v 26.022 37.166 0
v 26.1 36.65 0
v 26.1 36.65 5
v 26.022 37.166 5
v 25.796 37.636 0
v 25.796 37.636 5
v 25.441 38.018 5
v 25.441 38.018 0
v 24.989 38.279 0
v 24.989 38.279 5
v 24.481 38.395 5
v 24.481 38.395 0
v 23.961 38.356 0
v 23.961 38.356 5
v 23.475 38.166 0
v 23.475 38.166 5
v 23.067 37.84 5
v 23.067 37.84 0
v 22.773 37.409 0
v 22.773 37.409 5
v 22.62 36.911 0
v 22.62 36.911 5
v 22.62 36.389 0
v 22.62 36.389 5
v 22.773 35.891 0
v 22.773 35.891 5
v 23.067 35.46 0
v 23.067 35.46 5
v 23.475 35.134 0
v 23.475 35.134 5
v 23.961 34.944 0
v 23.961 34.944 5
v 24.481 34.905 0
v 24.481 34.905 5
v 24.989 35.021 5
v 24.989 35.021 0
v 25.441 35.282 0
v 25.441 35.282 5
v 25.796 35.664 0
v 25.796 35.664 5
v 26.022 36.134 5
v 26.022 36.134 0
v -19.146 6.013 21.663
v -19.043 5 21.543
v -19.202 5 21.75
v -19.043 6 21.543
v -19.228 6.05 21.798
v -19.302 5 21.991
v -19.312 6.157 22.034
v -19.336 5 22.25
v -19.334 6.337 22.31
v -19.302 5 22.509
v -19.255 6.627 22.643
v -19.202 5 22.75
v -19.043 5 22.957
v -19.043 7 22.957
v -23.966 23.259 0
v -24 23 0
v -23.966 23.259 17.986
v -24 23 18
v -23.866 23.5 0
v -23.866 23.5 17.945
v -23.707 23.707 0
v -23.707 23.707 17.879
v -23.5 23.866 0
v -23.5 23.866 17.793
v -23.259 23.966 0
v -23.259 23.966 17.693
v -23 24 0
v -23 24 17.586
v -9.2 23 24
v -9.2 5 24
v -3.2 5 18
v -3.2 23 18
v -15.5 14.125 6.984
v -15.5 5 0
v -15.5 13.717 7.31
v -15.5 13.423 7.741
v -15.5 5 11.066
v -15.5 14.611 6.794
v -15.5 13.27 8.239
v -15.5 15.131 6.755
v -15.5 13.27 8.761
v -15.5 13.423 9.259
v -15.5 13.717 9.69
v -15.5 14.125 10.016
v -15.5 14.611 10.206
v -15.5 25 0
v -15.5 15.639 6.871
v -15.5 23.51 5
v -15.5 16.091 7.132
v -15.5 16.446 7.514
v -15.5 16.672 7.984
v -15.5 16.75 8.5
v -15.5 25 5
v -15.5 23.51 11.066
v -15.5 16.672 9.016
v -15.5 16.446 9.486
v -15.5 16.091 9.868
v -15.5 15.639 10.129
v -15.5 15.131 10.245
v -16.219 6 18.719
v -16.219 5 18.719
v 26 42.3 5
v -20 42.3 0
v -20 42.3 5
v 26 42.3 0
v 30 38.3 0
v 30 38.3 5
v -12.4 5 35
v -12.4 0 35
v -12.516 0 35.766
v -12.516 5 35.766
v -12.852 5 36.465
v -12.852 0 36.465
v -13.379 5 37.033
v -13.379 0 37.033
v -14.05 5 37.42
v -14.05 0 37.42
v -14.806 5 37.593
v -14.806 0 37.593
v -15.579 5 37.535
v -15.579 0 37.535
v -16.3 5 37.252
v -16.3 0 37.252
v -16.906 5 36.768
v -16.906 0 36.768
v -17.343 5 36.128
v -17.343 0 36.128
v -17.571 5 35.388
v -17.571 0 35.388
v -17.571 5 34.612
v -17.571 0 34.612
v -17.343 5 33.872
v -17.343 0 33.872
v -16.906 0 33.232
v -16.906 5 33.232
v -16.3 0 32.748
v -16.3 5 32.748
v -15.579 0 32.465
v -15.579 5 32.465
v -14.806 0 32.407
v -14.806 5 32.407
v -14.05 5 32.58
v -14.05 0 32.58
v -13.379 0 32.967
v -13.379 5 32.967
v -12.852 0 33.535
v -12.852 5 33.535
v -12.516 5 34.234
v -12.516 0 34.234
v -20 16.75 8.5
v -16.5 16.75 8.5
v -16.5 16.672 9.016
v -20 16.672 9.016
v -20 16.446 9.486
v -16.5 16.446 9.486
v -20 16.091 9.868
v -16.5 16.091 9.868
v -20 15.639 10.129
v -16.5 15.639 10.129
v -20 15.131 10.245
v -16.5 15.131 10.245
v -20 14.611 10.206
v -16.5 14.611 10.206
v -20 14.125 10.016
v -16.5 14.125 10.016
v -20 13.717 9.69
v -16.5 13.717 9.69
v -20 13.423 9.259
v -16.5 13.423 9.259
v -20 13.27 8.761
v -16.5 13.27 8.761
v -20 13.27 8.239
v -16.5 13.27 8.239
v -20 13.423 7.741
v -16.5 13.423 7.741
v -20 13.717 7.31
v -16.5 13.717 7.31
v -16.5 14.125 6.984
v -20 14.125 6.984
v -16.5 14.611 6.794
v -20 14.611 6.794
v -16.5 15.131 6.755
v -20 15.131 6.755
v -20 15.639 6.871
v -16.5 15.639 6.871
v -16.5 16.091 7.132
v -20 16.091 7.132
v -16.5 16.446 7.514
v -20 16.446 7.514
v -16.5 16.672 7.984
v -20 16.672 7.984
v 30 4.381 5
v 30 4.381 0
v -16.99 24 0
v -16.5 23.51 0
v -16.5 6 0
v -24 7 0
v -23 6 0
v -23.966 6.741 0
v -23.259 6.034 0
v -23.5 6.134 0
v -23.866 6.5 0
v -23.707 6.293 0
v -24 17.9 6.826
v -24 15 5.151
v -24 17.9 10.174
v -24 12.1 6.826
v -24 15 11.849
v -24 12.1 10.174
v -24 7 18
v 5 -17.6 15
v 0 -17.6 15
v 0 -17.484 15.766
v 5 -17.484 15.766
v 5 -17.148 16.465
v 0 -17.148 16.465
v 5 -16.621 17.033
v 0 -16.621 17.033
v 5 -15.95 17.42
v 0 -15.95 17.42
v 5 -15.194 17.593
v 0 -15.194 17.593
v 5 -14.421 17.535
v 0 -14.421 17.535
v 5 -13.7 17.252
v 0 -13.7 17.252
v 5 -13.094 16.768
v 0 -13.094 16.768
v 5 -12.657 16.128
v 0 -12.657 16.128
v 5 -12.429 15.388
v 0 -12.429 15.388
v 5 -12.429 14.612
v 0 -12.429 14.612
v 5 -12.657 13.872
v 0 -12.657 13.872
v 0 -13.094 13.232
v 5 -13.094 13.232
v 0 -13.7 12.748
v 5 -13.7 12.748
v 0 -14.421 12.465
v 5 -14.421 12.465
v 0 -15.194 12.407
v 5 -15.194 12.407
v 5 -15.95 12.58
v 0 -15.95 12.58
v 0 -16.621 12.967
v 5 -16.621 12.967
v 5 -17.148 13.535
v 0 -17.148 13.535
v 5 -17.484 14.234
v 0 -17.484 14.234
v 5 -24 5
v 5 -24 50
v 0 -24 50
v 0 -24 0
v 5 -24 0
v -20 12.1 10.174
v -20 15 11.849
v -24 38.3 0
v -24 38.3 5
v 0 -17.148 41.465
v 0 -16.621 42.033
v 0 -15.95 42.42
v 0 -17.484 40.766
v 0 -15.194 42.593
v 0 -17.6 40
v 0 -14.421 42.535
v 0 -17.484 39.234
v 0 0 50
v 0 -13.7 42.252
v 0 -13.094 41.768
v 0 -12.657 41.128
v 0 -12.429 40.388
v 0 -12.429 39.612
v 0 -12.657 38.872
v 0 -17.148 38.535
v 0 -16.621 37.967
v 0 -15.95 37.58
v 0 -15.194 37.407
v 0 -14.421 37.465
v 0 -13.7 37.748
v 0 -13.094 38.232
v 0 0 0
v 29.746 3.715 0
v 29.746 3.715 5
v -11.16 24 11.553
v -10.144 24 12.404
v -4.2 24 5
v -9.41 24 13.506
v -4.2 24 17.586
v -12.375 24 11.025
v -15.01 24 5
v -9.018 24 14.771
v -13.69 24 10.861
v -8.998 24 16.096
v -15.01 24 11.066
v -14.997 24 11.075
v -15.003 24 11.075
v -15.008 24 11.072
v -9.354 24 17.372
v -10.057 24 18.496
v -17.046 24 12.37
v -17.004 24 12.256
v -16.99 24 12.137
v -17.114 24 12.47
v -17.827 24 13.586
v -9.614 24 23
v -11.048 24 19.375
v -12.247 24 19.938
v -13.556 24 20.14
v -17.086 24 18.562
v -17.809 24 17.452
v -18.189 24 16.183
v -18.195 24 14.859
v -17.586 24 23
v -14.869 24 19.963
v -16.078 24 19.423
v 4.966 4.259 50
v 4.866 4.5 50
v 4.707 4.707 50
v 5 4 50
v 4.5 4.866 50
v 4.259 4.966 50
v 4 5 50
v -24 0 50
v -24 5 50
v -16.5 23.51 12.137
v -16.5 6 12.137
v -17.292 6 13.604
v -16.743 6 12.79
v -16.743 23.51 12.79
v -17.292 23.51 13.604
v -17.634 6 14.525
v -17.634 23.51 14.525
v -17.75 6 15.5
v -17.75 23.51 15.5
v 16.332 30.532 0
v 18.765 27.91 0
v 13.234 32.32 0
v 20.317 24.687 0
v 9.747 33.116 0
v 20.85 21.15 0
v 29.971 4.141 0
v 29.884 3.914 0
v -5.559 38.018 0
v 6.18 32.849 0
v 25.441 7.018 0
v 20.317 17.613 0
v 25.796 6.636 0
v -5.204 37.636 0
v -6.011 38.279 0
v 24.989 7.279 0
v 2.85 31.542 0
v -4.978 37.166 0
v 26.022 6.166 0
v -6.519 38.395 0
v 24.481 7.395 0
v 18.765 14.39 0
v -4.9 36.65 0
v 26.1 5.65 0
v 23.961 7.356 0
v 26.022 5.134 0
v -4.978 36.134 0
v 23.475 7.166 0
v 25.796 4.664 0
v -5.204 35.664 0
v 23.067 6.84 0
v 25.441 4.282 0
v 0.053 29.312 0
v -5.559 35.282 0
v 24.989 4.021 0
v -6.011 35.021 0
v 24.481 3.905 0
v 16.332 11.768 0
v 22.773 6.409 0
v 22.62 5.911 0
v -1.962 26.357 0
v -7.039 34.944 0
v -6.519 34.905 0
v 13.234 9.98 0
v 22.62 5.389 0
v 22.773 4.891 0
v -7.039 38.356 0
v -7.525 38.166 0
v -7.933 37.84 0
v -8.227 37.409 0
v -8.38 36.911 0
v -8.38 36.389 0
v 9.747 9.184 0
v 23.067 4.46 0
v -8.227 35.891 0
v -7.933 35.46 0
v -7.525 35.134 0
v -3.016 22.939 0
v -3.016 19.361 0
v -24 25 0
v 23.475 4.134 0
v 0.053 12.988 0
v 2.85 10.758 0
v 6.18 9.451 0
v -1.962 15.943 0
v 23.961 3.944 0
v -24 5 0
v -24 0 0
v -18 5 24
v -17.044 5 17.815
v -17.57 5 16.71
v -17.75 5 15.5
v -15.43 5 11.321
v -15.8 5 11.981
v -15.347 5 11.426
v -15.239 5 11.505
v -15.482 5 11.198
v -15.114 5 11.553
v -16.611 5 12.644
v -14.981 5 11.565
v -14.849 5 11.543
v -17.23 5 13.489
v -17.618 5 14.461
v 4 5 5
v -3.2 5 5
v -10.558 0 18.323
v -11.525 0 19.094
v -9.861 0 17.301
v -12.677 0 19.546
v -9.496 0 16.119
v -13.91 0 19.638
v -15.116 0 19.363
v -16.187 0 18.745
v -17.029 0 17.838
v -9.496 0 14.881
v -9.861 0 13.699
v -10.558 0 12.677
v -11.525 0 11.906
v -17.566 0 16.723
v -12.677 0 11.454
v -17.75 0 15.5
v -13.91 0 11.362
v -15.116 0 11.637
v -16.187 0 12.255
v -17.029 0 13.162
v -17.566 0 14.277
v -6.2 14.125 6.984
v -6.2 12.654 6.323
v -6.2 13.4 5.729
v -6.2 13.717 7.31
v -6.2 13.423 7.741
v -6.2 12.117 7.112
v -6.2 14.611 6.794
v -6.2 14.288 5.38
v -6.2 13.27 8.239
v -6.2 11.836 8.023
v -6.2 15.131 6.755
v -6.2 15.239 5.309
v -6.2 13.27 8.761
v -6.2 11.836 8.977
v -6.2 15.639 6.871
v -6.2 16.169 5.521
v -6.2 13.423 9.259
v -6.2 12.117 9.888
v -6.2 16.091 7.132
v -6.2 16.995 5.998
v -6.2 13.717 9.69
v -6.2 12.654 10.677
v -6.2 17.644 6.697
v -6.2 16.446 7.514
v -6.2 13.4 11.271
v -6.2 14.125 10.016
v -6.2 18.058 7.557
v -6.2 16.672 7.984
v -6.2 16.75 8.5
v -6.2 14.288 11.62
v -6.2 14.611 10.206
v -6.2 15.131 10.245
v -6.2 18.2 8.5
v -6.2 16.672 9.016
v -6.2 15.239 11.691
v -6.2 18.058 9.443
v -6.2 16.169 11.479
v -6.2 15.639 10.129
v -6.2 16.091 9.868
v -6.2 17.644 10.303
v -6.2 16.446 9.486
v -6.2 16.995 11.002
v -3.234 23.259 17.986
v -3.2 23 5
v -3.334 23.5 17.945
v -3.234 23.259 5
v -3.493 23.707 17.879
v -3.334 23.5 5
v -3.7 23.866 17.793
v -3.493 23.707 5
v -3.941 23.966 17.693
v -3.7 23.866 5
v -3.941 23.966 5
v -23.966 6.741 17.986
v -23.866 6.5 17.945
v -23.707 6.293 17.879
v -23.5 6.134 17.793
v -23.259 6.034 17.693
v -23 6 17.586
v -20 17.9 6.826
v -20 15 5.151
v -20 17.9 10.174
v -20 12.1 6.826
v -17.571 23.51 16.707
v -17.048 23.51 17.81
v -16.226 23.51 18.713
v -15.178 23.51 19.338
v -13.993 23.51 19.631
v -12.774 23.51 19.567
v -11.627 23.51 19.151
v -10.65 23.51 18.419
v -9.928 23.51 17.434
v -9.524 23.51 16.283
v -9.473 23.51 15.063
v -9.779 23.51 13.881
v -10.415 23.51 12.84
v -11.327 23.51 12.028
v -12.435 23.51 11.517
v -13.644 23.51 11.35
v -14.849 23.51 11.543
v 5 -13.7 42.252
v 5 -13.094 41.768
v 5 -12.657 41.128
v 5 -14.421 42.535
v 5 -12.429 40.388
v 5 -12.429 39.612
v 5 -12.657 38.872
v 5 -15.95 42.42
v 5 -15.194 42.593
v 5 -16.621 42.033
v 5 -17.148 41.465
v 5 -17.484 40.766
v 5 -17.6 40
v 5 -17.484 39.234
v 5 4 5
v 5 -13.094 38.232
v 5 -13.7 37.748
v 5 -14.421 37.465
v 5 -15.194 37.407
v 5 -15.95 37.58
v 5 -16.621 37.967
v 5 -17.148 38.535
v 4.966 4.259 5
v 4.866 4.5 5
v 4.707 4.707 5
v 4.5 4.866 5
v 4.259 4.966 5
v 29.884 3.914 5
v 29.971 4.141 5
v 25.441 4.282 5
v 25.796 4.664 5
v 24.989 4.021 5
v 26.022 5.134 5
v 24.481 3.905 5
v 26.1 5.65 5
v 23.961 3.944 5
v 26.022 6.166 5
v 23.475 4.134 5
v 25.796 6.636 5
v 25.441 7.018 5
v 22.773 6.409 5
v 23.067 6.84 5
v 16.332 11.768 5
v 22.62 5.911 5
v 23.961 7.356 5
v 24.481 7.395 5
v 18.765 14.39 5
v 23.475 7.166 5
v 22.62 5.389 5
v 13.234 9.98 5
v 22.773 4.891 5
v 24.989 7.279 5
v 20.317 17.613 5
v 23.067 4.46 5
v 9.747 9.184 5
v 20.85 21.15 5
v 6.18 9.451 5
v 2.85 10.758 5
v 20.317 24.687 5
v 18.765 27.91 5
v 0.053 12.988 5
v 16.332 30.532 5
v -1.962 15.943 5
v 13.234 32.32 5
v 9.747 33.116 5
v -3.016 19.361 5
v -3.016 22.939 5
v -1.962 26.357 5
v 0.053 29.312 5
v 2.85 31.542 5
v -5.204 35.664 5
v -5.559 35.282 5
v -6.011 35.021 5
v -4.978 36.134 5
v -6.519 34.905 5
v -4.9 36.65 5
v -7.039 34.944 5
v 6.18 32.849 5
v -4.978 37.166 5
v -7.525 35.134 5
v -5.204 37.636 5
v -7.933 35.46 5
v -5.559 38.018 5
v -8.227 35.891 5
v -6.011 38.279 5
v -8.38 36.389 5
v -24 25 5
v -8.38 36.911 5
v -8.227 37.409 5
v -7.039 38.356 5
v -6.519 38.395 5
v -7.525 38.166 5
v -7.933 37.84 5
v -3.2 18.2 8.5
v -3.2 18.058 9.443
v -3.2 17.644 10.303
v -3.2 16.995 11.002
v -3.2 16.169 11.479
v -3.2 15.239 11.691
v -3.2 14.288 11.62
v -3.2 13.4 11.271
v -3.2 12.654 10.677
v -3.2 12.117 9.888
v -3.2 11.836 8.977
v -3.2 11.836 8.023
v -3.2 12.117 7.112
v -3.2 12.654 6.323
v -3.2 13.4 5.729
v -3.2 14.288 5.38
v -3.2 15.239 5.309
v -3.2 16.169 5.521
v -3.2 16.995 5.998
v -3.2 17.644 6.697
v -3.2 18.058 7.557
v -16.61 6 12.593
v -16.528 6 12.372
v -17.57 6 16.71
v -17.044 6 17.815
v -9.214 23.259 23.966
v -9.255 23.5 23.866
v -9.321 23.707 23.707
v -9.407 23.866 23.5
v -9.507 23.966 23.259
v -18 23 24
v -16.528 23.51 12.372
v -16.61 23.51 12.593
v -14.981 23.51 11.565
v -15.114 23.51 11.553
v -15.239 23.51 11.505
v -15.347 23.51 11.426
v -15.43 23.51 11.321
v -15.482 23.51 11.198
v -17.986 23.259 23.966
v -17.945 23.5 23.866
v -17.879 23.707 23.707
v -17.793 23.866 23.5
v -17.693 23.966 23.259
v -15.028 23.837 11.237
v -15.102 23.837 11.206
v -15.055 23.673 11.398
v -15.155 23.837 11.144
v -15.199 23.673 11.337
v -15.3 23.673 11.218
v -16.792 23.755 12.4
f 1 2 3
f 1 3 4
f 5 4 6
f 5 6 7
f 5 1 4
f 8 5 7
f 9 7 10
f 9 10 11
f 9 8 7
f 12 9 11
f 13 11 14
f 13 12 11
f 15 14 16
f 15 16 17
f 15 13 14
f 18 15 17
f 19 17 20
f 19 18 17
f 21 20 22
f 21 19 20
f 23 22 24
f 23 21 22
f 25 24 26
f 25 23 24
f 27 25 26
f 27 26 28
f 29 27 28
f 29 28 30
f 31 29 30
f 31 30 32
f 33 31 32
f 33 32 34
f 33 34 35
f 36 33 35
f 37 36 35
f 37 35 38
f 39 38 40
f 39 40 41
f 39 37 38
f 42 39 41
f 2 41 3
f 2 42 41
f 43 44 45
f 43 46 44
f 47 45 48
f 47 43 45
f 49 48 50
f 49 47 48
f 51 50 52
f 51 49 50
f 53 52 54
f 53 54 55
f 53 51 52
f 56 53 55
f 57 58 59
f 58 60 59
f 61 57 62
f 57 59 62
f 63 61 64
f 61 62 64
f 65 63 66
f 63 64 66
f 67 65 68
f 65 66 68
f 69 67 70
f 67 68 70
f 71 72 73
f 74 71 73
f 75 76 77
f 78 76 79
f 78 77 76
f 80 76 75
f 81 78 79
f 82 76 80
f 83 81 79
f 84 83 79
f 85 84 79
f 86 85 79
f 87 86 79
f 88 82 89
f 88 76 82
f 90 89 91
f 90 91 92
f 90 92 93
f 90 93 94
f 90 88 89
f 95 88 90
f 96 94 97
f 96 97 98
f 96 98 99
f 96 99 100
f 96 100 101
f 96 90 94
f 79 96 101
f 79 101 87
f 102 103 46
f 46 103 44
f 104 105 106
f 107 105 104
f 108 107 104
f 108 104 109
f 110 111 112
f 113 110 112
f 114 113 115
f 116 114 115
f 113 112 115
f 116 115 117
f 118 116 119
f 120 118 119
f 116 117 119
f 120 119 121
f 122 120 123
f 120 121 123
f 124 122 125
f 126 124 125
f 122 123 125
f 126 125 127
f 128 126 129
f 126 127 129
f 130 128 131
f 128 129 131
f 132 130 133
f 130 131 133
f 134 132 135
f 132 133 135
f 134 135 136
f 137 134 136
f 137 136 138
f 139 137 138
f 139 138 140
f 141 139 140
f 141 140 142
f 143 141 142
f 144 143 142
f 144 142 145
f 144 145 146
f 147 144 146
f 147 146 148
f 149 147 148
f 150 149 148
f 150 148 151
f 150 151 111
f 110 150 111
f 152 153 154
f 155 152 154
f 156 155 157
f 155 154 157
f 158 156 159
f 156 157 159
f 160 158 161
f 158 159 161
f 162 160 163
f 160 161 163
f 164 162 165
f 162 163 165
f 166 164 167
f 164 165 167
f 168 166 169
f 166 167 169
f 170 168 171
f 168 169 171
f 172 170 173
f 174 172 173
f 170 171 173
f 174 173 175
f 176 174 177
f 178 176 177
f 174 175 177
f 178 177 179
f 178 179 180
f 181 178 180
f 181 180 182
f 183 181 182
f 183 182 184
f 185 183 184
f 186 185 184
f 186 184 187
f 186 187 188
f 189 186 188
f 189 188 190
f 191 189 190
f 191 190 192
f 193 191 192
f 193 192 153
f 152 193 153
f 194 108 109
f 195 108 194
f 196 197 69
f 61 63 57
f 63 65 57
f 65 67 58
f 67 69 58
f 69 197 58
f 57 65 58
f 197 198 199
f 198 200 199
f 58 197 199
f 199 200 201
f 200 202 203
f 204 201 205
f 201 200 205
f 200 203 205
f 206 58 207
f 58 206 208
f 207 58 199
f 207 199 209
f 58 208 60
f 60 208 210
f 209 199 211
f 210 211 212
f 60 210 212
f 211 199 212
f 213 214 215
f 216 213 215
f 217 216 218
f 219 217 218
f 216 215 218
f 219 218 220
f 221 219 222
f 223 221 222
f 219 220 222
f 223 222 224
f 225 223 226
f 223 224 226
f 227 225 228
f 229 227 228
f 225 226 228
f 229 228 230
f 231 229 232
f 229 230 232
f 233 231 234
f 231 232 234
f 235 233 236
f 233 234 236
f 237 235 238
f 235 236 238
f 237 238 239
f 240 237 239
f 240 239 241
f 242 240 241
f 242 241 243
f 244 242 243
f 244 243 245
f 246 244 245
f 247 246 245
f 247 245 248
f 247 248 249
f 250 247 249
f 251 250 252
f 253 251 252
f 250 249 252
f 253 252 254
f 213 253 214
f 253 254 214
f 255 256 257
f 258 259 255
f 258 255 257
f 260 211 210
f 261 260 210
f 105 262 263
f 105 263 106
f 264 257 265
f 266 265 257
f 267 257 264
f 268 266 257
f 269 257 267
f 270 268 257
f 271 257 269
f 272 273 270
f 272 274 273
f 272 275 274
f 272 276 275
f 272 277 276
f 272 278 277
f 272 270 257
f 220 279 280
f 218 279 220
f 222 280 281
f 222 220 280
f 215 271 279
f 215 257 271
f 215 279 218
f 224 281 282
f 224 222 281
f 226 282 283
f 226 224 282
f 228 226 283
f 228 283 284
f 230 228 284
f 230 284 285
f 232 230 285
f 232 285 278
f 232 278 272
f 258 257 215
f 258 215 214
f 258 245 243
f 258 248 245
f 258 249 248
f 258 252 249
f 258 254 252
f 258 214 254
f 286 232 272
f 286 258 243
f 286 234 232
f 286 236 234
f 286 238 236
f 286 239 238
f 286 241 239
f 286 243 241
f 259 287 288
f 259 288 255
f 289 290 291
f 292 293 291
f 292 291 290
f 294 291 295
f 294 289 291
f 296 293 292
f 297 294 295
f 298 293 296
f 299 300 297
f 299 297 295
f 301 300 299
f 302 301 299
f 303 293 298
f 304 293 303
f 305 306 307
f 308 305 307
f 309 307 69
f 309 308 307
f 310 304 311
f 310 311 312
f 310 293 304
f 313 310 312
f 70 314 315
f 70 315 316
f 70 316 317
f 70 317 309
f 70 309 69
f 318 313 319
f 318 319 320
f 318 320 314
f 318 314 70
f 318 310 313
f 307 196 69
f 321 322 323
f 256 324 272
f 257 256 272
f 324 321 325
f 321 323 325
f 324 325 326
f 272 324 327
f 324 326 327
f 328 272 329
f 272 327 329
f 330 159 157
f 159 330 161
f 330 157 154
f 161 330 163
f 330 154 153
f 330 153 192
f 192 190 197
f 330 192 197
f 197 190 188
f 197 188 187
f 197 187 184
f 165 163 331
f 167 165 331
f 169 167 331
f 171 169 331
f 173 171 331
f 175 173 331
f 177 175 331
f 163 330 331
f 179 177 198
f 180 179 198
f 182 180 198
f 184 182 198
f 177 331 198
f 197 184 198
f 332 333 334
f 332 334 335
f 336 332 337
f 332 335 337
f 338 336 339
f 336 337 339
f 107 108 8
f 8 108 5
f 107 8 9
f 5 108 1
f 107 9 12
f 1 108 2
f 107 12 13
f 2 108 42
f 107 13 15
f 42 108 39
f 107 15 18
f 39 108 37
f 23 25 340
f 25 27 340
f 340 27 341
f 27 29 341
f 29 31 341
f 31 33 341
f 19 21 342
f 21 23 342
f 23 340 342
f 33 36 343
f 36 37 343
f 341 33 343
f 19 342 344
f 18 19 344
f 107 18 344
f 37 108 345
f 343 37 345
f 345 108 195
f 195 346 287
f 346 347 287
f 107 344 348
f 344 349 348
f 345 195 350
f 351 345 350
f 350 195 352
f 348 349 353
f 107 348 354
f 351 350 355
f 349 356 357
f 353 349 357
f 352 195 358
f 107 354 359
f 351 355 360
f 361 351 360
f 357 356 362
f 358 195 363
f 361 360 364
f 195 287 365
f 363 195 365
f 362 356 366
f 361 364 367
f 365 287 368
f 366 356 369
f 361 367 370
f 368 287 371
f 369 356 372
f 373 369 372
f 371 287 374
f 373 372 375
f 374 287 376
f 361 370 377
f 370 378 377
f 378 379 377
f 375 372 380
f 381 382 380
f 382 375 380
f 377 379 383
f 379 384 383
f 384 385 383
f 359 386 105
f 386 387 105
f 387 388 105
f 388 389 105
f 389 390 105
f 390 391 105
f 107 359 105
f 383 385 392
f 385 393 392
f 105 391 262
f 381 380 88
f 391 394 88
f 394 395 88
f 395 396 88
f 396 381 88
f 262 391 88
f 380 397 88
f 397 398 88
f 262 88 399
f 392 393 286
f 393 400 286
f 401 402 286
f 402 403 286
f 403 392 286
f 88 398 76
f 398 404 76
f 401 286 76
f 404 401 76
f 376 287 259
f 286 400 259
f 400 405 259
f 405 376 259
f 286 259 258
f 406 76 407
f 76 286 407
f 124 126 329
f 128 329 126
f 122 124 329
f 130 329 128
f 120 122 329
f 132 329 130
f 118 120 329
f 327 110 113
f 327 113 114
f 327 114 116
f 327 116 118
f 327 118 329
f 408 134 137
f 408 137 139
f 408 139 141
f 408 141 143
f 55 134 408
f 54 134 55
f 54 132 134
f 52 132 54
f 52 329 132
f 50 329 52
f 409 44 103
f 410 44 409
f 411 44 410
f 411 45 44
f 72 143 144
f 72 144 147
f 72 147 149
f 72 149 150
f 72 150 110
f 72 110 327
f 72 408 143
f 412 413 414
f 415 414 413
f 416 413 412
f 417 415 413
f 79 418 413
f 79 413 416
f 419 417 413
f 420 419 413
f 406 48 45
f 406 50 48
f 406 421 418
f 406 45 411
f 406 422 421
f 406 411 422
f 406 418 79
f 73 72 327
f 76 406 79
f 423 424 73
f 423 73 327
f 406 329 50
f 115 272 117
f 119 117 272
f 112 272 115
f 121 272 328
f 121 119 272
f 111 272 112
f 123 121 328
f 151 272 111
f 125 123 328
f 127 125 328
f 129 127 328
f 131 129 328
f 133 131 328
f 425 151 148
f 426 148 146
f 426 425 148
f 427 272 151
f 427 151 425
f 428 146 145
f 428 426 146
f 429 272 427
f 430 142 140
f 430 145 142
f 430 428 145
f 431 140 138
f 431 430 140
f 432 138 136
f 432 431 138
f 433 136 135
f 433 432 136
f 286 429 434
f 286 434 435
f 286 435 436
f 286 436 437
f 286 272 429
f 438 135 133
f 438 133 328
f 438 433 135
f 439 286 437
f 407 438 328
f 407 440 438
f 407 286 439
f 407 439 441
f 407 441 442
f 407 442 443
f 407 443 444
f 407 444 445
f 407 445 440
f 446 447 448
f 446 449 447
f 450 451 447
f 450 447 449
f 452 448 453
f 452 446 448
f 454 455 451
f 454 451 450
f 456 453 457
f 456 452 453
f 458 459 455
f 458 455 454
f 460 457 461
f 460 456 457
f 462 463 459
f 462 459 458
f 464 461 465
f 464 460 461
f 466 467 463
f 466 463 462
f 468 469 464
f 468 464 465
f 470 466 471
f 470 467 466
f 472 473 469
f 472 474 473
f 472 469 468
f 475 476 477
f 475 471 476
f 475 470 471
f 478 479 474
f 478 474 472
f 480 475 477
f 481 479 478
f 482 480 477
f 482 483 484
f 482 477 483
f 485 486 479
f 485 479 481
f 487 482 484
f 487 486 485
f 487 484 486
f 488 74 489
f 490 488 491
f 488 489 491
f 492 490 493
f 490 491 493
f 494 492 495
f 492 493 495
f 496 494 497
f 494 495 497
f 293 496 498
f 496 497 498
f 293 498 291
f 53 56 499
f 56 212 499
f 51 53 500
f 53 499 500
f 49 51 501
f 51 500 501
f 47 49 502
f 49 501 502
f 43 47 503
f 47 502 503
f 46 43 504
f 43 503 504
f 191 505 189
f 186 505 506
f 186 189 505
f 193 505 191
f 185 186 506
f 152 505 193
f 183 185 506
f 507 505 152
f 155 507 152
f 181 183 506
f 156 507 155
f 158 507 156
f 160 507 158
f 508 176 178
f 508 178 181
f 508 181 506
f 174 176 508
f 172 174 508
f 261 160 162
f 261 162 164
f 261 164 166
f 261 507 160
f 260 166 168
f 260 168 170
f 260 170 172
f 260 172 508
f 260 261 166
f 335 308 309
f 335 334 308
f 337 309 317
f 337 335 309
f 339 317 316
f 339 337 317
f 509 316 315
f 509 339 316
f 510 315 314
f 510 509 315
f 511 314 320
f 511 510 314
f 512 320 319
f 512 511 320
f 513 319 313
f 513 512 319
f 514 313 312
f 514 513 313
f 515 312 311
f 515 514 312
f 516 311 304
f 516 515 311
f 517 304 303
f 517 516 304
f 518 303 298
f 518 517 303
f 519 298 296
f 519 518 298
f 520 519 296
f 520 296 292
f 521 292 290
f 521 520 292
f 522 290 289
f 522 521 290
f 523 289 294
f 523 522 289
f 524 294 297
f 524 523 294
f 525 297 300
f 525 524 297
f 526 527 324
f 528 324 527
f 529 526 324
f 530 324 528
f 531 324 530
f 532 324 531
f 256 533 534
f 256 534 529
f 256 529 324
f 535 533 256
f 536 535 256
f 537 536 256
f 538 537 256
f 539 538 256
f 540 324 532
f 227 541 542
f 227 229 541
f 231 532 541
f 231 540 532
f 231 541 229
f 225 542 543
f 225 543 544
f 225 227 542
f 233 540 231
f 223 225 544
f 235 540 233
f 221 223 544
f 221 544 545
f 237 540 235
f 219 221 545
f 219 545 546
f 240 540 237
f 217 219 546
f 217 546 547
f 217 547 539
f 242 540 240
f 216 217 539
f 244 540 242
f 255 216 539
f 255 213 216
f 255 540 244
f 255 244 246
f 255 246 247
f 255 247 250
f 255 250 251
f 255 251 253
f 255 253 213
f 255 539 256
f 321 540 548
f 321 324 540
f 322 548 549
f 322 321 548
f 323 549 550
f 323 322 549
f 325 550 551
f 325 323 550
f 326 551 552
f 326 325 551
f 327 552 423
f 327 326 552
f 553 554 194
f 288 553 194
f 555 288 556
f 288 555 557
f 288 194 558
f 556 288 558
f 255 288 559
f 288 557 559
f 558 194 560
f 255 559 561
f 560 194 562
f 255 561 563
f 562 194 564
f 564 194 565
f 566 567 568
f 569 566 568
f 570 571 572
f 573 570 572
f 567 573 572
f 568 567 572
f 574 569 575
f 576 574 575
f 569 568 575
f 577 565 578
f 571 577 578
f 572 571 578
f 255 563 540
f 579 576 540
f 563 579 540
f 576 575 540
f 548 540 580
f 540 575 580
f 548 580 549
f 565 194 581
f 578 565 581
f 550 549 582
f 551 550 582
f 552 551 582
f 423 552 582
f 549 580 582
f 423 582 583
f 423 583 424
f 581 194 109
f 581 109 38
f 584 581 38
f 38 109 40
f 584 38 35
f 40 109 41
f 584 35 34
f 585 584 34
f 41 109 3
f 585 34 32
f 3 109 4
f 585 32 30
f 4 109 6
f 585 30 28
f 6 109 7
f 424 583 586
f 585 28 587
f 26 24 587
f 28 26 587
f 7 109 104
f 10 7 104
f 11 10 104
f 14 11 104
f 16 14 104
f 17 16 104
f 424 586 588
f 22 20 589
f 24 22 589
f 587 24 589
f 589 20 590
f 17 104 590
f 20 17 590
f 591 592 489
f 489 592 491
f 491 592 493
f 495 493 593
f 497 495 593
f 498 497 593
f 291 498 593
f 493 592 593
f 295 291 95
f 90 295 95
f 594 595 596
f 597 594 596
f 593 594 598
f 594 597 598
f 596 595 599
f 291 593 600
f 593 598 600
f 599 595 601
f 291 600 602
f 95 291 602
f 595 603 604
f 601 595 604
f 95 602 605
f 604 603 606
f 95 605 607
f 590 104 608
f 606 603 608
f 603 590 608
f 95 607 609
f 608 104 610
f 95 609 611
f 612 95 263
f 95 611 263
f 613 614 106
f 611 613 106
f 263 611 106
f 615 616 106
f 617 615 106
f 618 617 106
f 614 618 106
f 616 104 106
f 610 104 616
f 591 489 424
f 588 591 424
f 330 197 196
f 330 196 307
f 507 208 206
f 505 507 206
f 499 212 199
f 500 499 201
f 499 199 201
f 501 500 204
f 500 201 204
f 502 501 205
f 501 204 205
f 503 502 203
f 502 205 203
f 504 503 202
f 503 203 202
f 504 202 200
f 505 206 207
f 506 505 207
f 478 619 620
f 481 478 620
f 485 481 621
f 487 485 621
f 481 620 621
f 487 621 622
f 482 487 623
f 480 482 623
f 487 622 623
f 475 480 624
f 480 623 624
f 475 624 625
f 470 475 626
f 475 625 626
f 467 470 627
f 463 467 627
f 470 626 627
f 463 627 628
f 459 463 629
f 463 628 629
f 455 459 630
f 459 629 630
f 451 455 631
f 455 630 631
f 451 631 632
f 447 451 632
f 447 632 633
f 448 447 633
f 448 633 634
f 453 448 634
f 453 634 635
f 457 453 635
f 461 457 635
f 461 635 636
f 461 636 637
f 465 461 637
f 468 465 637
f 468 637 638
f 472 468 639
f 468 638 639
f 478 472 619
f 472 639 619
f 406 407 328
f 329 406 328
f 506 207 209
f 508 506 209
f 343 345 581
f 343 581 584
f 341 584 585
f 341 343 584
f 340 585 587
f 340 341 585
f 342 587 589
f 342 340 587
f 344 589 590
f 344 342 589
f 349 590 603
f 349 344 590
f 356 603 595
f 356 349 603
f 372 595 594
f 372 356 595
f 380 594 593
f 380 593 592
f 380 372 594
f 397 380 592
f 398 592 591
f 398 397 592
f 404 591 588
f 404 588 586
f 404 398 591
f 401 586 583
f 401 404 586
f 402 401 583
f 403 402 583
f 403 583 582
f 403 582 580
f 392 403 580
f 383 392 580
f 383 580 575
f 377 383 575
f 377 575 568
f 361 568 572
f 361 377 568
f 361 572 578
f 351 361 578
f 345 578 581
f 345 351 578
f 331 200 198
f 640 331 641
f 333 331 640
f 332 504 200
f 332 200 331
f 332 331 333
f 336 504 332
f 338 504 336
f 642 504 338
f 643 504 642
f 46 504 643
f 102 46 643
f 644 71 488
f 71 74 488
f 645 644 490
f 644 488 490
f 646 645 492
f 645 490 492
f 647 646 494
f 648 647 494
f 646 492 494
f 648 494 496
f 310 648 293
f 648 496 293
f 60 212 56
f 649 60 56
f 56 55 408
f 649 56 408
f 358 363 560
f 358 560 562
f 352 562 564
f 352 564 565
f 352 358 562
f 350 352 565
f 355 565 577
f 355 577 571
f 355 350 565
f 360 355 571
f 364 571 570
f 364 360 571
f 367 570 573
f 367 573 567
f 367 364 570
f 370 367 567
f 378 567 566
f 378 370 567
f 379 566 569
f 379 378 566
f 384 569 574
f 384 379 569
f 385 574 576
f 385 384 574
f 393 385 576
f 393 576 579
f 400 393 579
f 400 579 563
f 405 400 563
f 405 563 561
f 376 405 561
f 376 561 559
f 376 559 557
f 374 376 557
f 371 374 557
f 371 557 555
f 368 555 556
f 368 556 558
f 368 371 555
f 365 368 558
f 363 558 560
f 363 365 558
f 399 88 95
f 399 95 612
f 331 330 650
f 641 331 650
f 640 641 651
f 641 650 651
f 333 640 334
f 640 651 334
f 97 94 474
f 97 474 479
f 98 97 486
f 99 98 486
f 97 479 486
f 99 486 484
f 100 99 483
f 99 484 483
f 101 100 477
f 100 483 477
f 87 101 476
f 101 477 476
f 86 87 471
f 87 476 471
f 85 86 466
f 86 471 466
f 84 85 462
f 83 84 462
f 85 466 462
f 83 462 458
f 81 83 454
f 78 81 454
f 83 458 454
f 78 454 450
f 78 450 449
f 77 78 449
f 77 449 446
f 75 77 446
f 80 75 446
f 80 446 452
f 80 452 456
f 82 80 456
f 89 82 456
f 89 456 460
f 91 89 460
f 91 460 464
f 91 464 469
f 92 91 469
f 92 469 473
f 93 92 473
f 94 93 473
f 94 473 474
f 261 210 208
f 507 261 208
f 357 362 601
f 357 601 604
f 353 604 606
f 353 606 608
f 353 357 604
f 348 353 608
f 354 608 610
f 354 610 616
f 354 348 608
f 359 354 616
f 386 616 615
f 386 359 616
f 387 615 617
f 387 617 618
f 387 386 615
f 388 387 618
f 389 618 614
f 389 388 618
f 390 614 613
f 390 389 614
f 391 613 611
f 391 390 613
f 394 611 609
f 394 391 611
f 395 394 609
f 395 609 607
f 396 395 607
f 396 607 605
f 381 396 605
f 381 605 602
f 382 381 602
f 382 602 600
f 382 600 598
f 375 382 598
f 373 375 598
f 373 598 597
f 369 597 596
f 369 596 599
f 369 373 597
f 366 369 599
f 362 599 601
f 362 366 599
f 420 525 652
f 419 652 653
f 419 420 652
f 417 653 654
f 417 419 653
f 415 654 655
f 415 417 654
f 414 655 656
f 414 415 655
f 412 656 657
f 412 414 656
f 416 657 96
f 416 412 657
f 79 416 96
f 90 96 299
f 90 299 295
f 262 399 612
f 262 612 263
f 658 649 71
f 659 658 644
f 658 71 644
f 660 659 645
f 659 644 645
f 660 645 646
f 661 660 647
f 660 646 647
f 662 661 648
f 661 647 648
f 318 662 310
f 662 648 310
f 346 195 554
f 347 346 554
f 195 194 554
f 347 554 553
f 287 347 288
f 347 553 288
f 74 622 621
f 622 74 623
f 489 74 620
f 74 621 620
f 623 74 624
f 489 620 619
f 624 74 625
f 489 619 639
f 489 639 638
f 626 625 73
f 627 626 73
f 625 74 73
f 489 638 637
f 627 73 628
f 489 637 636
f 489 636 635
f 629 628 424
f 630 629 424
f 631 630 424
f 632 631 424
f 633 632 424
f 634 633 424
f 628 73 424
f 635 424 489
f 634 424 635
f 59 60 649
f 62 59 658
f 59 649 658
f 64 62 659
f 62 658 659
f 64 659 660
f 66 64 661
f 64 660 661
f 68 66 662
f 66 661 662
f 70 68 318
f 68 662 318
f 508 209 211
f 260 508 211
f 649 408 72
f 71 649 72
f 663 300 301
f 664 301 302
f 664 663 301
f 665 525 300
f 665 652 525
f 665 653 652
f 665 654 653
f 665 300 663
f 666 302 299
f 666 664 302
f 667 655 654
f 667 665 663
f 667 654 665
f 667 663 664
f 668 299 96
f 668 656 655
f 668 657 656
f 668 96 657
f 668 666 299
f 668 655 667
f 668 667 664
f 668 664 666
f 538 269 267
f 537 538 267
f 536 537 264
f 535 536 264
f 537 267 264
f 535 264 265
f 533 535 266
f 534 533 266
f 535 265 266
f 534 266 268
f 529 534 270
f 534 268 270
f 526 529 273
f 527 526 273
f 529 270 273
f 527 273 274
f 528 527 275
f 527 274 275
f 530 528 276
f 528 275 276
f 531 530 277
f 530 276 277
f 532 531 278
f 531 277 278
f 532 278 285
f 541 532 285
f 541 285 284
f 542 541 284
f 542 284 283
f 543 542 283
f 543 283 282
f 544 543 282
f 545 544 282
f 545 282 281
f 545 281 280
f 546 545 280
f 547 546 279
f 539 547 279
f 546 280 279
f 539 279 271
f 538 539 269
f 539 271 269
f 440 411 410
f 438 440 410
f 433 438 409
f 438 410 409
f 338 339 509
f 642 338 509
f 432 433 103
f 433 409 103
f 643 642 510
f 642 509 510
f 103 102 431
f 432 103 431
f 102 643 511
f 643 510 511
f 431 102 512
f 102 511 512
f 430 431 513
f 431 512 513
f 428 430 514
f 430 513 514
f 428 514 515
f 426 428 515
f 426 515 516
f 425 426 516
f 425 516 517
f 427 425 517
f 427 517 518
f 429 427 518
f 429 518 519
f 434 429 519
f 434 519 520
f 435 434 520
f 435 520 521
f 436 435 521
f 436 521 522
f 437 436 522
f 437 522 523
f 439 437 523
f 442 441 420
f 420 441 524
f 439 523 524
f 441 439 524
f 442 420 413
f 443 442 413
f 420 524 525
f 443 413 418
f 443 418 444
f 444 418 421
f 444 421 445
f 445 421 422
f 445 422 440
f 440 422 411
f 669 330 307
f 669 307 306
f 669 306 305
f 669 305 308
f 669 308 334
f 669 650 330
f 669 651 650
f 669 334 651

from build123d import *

# Parameters (mm, degrees)
SKETCH_R        = 12
SKETCH_R_2      = 1.75
PAD_DEPTH       = 5
PAD001_DEPTH    = 45
PAD002_DEPTH    = 19
POCKET_DEPTH    = 1
SKETCH004_R     = 4.15
POCKET001_DEPTH = 48.001
SKETCH005_R     = 2.6
POCKET002_DEPTH = 42.301
SKETCH006_R     = 2.6
POCKET003_DEPTH = 5
SKETCH008_R     = 1.75
POCKET004_DEPTH = 20.801
SKETCH009_R     = 3.2
POCKET005_DEPTH = 3
POCKET006_DEPTH = 4
SKETCH011_W     = 1
SKETCH011_H     = 8
POCKET007_DEPTH = 18.99
FILLET_R        = 1
FILLET001_R     = 0.5
CHAMFER_SIZE    = 0.49


with BuildPart() as part:
    # Sketch → Pad (new body)
    with BuildSketch(Plane.XY):
        Polygon((0, 0), (-24, 0), (-24, 5), (-15.5, 5), (-15.5, 25), (-24, 25), (-24, 38.3), (-20, 42.3), (26, 42.3), (30, 38.3), (30, 4), (5, -24), (0, -24), align=None)
        with Locations((8.85, 21.15)):
            Circle(SKETCH_R, mode=Mode.SUBTRACT)
        with Locations((-6.65, 36.65)):
            Circle(SKETCH_R_2, mode=Mode.SUBTRACT)
        with Locations((24.35, 36.65)):
            Circle(SKETCH_R_2, mode=Mode.SUBTRACT)
        with Locations((24.35, 5.65)):
            Circle(SKETCH_R_2, mode=Mode.SUBTRACT)
    extrude(amount=PAD_DEPTH)

    # Sketch001 (on Face19 of Pad) → Pad001 (join)
    with BuildSketch(Plane.XY.offset(5)):
        Polygon((0, 0), (-24, 0), (-24, 5), (5, 5), (5, -24), (0, -24), align=None)
    extrude(amount=PAD001_DEPTH)

    # Sketch002 (on Face21 of Pad001) → Pad002 (join)
    with BuildSketch(Plane(origin=(0, 5, 0), x_dir=(-1, 0, 0), z_dir=(0, 1, 0))):
        Polygon((24, 0), (24, 18), (18, 24), (9.2, 24), (3.2, 18), (3.2, 5), (16.5, 5), (16.5, 0), align=None)
    extrude(amount=PAD002_DEPTH)

    # Sketch003 (on Face30 of Pad002) → Pocket (cut)
    with BuildSketch(Plane(origin=(0, 5, 0), x_dir=(-1, 0, 0), z_dir=(0, 1, 0))):
        Polygon((15.5, 0), (15.5, 18), (19.75, 22.25), (24, 18), (24, 0), align=None)
    extrude(amount=POCKET_DEPTH, mode=Mode.SUBTRACT)

    # Sketch004 (on Face37 of Pocket) → Pocket001 (cut, through all)
    with BuildSketch(Plane(origin=(0, 24, 0), x_dir=(-1, 0, 0), z_dir=(0, 1, 0))):
        with Locations((13.6, 15.5)):
            Circle(SKETCH004_R)
    extrude(amount=-POCKET001_DEPTH, mode=Mode.SUBTRACT)

    # Sketch005 (on Face4 of Pocket001) → Pocket002 (cut, through all)
    with BuildSketch(Plane.XZ):
        with Locations((-15, 35)):
            Circle(SKETCH005_R)
    extrude(amount=-POCKET002_DEPTH, mode=Mode.SUBTRACT)

    # Sketch006 (on Face7 of Pocket002) → Pocket003 (cut)
    with BuildSketch(Plane(origin=(0, 0, 0), x_dir=(0, -1, 0), z_dir=(-1, 0, 0))):
        with Locations((15, 40)):
            Circle(SKETCH006_R)
        with Locations((15, 15)):
            Circle(SKETCH006_R)
    extrude(amount=-POCKET003_DEPTH, mode=Mode.SUBTRACT)

    # Sketch008 (on Face41 of Pocket003) → Pocket004 (cut, through all)
    with BuildSketch(Plane.YZ.offset(-3.2)):
        with Locations((15, 8.5)):
            Circle(SKETCH008_R)
    extrude(amount=-POCKET004_DEPTH, mode=Mode.SUBTRACT)

    # Sketch009 (on Face41 of Pocket004) → Pocket005 (cut)
    with BuildSketch(Plane.YZ.offset(-3.2)):
        with Locations((15, 8.5)):
            Circle(SKETCH009_R)
    extrude(amount=-POCKET005_DEPTH, mode=Mode.SUBTRACT)

    # Sketch010 (on Face43 of Pocket005) → Pocket006 (cut)
    with BuildSketch(Plane(origin=(-24, 0, 0), x_dir=(0, -1, 0), z_dir=(-1, 0, 0))):
        Polygon((-12.1, 6.825684), (-12.1, 10.174316), (-15, 11.848632), (-17.9, 10.174316), (-17.9, 6.825684), (-15, 5.151368), align=None)
    extrude(amount=-POCKET006_DEPTH, mode=Mode.SUBTRACT)

    # Sketch011 (on Face36 of Pocket006) → Pocket007 (cut)
    with BuildSketch(Plane(origin=(0, 24, 0), x_dir=(-1, 0, 0), z_dir=(0, 1, 0))):
        with Locations((16, 9)):
            Rectangle(SKETCH011_W, SKETCH011_H)
    extrude(amount=-POCKET007_DEPTH, mode=Mode.SUBTRACT)

    # Fillet
    fillet_edges = [part.edges().sort_by_distance(p)[0] for p in [
        (5, 5, 27.5),
        (-3.2, 24, 11.5),
        (-6.2, 24, 21),
        (-13.6, 24, 24),
        (-21, 24, 21),
        (-24, 24, 9),
        (30, 4, 2.5),
        (-24, 6, 9),
        (-21.875, 6, 20.125),
        (-19.75, 5.5, 22.25),
        (-16.5, 15, 12.531414),
    ]]
    fillet(fillet_edges, radius=FILLET_R)

    # Fillet001
    fillet001_edges = [part.edges().sort_by_distance(p)[0] for p in [
        (-15.5, 15, 11.810488),
    ]]
    fillet(fillet001_edges, radius=FILLET001_R)

    # Chamfer
    chamfer_edges = [part.edges().sort_by_distance(p)[0] for p in [
        (-10.25278, 24, 17.953287),
    ]]
    chamfer(chamfer_edges, length=CHAMFER_SIZE)


solid = part.part
